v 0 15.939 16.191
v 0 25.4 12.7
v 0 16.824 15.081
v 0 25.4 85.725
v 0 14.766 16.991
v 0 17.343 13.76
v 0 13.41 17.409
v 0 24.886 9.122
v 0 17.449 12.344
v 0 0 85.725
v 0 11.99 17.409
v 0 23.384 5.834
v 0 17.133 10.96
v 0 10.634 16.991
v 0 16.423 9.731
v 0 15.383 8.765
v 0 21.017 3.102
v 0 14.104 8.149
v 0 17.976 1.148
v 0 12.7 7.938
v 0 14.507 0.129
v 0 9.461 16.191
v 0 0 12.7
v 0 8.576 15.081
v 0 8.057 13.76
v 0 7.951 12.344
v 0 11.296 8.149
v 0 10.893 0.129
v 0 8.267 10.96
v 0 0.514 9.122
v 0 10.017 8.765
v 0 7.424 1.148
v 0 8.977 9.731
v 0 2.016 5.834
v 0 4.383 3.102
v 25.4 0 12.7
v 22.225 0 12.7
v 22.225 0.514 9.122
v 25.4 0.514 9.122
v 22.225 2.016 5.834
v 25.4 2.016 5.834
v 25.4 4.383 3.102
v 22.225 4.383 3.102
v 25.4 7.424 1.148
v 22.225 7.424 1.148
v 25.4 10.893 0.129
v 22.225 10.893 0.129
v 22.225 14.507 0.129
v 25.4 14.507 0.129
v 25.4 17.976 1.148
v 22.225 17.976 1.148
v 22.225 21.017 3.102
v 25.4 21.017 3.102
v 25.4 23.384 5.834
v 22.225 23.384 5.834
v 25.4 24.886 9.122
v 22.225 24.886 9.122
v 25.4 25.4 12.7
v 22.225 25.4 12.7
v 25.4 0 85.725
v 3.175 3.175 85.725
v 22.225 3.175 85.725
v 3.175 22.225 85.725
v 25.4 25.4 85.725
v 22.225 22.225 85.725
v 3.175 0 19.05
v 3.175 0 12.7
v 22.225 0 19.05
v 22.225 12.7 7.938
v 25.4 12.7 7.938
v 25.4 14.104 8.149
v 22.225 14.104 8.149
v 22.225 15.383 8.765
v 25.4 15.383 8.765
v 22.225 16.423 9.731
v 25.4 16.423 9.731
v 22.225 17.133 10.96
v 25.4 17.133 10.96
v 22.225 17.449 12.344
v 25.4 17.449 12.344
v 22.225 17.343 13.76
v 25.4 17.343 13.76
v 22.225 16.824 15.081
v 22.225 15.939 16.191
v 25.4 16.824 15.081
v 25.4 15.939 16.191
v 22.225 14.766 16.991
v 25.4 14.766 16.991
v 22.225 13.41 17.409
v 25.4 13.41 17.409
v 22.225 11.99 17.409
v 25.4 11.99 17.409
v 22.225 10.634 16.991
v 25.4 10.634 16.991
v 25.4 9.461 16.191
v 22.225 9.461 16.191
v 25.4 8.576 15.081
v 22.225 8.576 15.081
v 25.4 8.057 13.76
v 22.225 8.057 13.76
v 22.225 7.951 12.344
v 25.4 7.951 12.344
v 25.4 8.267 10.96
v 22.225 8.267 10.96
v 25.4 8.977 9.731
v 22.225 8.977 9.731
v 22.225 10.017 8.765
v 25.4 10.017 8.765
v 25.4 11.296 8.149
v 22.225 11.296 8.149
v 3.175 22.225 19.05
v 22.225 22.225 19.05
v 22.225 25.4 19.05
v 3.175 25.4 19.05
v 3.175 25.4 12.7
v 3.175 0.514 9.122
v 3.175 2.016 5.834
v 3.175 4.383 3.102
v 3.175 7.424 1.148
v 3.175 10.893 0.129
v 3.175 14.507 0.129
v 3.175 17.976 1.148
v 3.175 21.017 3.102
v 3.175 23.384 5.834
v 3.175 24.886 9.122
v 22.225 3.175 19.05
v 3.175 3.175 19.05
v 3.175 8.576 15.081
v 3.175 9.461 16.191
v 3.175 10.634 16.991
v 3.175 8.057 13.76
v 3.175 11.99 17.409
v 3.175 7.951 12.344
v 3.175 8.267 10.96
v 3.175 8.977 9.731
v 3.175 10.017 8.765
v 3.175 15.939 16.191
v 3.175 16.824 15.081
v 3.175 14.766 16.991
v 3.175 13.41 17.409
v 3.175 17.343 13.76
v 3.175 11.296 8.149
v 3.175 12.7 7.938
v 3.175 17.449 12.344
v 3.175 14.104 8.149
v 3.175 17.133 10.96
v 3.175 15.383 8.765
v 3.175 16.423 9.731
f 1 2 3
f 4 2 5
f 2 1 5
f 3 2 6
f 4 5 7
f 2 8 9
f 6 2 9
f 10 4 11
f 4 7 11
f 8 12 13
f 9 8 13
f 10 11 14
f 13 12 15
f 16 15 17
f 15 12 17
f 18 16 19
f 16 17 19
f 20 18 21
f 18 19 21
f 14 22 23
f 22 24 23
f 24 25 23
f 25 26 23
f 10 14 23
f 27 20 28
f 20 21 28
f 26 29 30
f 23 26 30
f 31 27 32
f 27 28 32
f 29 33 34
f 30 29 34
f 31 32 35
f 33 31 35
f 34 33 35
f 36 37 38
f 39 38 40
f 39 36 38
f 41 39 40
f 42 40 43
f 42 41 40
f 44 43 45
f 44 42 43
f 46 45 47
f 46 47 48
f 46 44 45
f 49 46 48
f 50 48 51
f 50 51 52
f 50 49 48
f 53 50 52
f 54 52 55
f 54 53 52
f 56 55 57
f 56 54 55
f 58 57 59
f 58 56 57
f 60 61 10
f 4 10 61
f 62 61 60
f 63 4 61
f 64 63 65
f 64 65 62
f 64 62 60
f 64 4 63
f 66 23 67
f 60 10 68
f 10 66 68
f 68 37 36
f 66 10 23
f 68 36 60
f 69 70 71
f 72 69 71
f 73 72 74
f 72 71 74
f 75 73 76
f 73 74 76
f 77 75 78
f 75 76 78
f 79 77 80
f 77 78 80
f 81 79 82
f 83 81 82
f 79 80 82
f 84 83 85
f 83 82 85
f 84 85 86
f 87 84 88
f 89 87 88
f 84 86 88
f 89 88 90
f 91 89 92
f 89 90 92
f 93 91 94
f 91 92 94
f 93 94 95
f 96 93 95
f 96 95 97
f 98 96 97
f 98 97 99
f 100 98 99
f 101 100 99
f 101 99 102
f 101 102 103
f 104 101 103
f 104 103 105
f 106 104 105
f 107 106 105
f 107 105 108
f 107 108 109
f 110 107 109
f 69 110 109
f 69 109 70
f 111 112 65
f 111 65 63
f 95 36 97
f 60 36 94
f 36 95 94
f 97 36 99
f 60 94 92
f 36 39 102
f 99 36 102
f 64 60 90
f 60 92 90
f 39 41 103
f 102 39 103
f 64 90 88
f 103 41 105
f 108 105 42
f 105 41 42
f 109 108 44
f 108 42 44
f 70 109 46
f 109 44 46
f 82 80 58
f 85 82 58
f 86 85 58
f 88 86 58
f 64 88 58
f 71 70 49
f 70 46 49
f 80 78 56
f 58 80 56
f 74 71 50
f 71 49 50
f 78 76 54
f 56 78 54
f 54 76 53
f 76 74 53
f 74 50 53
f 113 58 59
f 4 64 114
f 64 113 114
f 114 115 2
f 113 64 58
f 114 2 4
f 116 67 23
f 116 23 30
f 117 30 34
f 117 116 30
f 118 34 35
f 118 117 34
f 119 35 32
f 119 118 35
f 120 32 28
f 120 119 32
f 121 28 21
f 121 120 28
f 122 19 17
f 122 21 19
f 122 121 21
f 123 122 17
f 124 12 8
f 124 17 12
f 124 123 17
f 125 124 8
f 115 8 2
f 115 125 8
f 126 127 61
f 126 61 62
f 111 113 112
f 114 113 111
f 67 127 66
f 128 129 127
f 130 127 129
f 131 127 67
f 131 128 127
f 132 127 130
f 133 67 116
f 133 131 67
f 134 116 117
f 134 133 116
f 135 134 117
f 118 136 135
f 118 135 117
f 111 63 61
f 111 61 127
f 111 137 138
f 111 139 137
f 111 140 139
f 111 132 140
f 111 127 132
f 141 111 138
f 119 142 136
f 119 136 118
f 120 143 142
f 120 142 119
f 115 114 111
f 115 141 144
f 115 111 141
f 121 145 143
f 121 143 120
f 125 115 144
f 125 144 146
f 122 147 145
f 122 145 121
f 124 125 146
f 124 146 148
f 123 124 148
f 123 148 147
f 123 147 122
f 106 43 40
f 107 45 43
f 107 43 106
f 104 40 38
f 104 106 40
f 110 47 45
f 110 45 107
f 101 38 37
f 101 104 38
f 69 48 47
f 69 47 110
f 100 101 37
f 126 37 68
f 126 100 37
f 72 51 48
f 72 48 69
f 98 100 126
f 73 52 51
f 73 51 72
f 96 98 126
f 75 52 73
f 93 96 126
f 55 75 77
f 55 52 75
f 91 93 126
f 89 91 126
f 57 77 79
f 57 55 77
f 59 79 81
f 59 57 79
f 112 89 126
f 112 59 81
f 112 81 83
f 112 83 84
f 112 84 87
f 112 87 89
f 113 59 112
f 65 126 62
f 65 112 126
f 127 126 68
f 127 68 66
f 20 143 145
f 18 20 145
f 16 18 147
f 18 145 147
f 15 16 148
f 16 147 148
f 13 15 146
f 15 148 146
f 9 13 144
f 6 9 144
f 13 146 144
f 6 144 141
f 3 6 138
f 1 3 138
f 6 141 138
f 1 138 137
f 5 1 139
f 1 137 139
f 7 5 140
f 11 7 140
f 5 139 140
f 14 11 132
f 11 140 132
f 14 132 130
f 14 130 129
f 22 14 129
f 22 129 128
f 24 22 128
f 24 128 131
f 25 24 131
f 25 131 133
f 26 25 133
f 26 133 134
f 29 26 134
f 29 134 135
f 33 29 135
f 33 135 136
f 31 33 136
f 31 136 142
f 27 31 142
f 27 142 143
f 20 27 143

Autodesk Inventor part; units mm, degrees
ref_plane "YZ Plane" through (0, 0, 0) normal (1, 0, 0) x (0, 1, 0)
ref_plane "XZ Plane" through (0, 0, 0) normal (0, 1, 0) x (-1, 0, 0)
ref_plane "XY Plane" through (0, 0, 0) normal (0, 0, 1) x (1, 0, 0)
sketch "Sketch1" plane through (0, 0, 0) normal (0, 0, 1) x (1, 0, 0)
  line L0 (0, 0) -> (25.4, 0)
  line L1 (25.4, 0) -> (25.4, 25.4)
  line L2 (25.4, 25.4) -> (0, 25.4)
  line L3 (0, 25.4) -> (0, 0)
  line L4 (3.175, 3.175) -> (22.225, 3.175)
  line L5 (22.225, 3.175) -> (22.225, 22.225)
  line L6 (22.225, 22.225) -> (3.175, 22.225)
  line L7 (3.175, 22.225) -> (3.175, 3.175)
  dimension "d0" = 25.4
  dimension "d1" = 25.4
  dimension "d2" = 3.175
  dimension "d3" = 3.175
  dimension "d4" = 3.175
  dimension "d5" = 3.175
extrude "Extrusion1" add sketch "Sketch1" along normal blind 85.725
sketch "Sketch2" plane through (25.4, 0, 0) normal (1, 0, 0) x (0, 0, -1)
  line L0 (-85.725, 25.4) -> (-85.725, 0) projected
  line L1 (0, 0) -> (-85.725, 0) projected
  line L2 (0, 0) -> (0, 25.4) projected
  line L3 (0, 25.4) -> (-85.725, 25.4) projected
  circle A0 centre (-12.7, 12.7) radius 4.7625
  arc A1 (-12.7, 0) -> (-12.7, 25.4) centre (-12.7, 12.7) ccw
  dimension "d8" = 9.525
  dimension "d9" = 12.7
  dimension "d10" = 12.7
extrude "Extrusion2" cut sketch "Sketch2" against normal blind 25.4 contours L3 L2 A1 | A1 L2 L1 | A0
sketch "Sketch3" plane through (0, 25.4, 85.725) normal (0, 1, 0) x (1, 0, 0)
  line L0 (0, 73.025) -> (25.4, 73.025) projected
  line L1 (3.175, 82.55) -> (22.225, 82.55)
  line L2 (22.225, 82.55) -> (22.225, 66.675)
  line L3 (22.225, 66.675) -> (3.175, 66.675)
  line L4 (3.175, 66.675) -> (3.175, 82.55)
  line L5 (0, 85.725) -> (0, 73.025) projected
  dimension "d13" = 19.05
  dimension "d14" = 3.175
  dimension "d17" = 15.875
  dimension "d18" = 6.35
extrude "Extrusion3" cut sketch "Sketch3" against normal through all
equation "\"d2\" = d5"
equation "\"d3\" = d2"
equation "\"d5\" = d4"
equation "\"d10\" = d9"
properties part number "8 ball pnumatic arm tube"
